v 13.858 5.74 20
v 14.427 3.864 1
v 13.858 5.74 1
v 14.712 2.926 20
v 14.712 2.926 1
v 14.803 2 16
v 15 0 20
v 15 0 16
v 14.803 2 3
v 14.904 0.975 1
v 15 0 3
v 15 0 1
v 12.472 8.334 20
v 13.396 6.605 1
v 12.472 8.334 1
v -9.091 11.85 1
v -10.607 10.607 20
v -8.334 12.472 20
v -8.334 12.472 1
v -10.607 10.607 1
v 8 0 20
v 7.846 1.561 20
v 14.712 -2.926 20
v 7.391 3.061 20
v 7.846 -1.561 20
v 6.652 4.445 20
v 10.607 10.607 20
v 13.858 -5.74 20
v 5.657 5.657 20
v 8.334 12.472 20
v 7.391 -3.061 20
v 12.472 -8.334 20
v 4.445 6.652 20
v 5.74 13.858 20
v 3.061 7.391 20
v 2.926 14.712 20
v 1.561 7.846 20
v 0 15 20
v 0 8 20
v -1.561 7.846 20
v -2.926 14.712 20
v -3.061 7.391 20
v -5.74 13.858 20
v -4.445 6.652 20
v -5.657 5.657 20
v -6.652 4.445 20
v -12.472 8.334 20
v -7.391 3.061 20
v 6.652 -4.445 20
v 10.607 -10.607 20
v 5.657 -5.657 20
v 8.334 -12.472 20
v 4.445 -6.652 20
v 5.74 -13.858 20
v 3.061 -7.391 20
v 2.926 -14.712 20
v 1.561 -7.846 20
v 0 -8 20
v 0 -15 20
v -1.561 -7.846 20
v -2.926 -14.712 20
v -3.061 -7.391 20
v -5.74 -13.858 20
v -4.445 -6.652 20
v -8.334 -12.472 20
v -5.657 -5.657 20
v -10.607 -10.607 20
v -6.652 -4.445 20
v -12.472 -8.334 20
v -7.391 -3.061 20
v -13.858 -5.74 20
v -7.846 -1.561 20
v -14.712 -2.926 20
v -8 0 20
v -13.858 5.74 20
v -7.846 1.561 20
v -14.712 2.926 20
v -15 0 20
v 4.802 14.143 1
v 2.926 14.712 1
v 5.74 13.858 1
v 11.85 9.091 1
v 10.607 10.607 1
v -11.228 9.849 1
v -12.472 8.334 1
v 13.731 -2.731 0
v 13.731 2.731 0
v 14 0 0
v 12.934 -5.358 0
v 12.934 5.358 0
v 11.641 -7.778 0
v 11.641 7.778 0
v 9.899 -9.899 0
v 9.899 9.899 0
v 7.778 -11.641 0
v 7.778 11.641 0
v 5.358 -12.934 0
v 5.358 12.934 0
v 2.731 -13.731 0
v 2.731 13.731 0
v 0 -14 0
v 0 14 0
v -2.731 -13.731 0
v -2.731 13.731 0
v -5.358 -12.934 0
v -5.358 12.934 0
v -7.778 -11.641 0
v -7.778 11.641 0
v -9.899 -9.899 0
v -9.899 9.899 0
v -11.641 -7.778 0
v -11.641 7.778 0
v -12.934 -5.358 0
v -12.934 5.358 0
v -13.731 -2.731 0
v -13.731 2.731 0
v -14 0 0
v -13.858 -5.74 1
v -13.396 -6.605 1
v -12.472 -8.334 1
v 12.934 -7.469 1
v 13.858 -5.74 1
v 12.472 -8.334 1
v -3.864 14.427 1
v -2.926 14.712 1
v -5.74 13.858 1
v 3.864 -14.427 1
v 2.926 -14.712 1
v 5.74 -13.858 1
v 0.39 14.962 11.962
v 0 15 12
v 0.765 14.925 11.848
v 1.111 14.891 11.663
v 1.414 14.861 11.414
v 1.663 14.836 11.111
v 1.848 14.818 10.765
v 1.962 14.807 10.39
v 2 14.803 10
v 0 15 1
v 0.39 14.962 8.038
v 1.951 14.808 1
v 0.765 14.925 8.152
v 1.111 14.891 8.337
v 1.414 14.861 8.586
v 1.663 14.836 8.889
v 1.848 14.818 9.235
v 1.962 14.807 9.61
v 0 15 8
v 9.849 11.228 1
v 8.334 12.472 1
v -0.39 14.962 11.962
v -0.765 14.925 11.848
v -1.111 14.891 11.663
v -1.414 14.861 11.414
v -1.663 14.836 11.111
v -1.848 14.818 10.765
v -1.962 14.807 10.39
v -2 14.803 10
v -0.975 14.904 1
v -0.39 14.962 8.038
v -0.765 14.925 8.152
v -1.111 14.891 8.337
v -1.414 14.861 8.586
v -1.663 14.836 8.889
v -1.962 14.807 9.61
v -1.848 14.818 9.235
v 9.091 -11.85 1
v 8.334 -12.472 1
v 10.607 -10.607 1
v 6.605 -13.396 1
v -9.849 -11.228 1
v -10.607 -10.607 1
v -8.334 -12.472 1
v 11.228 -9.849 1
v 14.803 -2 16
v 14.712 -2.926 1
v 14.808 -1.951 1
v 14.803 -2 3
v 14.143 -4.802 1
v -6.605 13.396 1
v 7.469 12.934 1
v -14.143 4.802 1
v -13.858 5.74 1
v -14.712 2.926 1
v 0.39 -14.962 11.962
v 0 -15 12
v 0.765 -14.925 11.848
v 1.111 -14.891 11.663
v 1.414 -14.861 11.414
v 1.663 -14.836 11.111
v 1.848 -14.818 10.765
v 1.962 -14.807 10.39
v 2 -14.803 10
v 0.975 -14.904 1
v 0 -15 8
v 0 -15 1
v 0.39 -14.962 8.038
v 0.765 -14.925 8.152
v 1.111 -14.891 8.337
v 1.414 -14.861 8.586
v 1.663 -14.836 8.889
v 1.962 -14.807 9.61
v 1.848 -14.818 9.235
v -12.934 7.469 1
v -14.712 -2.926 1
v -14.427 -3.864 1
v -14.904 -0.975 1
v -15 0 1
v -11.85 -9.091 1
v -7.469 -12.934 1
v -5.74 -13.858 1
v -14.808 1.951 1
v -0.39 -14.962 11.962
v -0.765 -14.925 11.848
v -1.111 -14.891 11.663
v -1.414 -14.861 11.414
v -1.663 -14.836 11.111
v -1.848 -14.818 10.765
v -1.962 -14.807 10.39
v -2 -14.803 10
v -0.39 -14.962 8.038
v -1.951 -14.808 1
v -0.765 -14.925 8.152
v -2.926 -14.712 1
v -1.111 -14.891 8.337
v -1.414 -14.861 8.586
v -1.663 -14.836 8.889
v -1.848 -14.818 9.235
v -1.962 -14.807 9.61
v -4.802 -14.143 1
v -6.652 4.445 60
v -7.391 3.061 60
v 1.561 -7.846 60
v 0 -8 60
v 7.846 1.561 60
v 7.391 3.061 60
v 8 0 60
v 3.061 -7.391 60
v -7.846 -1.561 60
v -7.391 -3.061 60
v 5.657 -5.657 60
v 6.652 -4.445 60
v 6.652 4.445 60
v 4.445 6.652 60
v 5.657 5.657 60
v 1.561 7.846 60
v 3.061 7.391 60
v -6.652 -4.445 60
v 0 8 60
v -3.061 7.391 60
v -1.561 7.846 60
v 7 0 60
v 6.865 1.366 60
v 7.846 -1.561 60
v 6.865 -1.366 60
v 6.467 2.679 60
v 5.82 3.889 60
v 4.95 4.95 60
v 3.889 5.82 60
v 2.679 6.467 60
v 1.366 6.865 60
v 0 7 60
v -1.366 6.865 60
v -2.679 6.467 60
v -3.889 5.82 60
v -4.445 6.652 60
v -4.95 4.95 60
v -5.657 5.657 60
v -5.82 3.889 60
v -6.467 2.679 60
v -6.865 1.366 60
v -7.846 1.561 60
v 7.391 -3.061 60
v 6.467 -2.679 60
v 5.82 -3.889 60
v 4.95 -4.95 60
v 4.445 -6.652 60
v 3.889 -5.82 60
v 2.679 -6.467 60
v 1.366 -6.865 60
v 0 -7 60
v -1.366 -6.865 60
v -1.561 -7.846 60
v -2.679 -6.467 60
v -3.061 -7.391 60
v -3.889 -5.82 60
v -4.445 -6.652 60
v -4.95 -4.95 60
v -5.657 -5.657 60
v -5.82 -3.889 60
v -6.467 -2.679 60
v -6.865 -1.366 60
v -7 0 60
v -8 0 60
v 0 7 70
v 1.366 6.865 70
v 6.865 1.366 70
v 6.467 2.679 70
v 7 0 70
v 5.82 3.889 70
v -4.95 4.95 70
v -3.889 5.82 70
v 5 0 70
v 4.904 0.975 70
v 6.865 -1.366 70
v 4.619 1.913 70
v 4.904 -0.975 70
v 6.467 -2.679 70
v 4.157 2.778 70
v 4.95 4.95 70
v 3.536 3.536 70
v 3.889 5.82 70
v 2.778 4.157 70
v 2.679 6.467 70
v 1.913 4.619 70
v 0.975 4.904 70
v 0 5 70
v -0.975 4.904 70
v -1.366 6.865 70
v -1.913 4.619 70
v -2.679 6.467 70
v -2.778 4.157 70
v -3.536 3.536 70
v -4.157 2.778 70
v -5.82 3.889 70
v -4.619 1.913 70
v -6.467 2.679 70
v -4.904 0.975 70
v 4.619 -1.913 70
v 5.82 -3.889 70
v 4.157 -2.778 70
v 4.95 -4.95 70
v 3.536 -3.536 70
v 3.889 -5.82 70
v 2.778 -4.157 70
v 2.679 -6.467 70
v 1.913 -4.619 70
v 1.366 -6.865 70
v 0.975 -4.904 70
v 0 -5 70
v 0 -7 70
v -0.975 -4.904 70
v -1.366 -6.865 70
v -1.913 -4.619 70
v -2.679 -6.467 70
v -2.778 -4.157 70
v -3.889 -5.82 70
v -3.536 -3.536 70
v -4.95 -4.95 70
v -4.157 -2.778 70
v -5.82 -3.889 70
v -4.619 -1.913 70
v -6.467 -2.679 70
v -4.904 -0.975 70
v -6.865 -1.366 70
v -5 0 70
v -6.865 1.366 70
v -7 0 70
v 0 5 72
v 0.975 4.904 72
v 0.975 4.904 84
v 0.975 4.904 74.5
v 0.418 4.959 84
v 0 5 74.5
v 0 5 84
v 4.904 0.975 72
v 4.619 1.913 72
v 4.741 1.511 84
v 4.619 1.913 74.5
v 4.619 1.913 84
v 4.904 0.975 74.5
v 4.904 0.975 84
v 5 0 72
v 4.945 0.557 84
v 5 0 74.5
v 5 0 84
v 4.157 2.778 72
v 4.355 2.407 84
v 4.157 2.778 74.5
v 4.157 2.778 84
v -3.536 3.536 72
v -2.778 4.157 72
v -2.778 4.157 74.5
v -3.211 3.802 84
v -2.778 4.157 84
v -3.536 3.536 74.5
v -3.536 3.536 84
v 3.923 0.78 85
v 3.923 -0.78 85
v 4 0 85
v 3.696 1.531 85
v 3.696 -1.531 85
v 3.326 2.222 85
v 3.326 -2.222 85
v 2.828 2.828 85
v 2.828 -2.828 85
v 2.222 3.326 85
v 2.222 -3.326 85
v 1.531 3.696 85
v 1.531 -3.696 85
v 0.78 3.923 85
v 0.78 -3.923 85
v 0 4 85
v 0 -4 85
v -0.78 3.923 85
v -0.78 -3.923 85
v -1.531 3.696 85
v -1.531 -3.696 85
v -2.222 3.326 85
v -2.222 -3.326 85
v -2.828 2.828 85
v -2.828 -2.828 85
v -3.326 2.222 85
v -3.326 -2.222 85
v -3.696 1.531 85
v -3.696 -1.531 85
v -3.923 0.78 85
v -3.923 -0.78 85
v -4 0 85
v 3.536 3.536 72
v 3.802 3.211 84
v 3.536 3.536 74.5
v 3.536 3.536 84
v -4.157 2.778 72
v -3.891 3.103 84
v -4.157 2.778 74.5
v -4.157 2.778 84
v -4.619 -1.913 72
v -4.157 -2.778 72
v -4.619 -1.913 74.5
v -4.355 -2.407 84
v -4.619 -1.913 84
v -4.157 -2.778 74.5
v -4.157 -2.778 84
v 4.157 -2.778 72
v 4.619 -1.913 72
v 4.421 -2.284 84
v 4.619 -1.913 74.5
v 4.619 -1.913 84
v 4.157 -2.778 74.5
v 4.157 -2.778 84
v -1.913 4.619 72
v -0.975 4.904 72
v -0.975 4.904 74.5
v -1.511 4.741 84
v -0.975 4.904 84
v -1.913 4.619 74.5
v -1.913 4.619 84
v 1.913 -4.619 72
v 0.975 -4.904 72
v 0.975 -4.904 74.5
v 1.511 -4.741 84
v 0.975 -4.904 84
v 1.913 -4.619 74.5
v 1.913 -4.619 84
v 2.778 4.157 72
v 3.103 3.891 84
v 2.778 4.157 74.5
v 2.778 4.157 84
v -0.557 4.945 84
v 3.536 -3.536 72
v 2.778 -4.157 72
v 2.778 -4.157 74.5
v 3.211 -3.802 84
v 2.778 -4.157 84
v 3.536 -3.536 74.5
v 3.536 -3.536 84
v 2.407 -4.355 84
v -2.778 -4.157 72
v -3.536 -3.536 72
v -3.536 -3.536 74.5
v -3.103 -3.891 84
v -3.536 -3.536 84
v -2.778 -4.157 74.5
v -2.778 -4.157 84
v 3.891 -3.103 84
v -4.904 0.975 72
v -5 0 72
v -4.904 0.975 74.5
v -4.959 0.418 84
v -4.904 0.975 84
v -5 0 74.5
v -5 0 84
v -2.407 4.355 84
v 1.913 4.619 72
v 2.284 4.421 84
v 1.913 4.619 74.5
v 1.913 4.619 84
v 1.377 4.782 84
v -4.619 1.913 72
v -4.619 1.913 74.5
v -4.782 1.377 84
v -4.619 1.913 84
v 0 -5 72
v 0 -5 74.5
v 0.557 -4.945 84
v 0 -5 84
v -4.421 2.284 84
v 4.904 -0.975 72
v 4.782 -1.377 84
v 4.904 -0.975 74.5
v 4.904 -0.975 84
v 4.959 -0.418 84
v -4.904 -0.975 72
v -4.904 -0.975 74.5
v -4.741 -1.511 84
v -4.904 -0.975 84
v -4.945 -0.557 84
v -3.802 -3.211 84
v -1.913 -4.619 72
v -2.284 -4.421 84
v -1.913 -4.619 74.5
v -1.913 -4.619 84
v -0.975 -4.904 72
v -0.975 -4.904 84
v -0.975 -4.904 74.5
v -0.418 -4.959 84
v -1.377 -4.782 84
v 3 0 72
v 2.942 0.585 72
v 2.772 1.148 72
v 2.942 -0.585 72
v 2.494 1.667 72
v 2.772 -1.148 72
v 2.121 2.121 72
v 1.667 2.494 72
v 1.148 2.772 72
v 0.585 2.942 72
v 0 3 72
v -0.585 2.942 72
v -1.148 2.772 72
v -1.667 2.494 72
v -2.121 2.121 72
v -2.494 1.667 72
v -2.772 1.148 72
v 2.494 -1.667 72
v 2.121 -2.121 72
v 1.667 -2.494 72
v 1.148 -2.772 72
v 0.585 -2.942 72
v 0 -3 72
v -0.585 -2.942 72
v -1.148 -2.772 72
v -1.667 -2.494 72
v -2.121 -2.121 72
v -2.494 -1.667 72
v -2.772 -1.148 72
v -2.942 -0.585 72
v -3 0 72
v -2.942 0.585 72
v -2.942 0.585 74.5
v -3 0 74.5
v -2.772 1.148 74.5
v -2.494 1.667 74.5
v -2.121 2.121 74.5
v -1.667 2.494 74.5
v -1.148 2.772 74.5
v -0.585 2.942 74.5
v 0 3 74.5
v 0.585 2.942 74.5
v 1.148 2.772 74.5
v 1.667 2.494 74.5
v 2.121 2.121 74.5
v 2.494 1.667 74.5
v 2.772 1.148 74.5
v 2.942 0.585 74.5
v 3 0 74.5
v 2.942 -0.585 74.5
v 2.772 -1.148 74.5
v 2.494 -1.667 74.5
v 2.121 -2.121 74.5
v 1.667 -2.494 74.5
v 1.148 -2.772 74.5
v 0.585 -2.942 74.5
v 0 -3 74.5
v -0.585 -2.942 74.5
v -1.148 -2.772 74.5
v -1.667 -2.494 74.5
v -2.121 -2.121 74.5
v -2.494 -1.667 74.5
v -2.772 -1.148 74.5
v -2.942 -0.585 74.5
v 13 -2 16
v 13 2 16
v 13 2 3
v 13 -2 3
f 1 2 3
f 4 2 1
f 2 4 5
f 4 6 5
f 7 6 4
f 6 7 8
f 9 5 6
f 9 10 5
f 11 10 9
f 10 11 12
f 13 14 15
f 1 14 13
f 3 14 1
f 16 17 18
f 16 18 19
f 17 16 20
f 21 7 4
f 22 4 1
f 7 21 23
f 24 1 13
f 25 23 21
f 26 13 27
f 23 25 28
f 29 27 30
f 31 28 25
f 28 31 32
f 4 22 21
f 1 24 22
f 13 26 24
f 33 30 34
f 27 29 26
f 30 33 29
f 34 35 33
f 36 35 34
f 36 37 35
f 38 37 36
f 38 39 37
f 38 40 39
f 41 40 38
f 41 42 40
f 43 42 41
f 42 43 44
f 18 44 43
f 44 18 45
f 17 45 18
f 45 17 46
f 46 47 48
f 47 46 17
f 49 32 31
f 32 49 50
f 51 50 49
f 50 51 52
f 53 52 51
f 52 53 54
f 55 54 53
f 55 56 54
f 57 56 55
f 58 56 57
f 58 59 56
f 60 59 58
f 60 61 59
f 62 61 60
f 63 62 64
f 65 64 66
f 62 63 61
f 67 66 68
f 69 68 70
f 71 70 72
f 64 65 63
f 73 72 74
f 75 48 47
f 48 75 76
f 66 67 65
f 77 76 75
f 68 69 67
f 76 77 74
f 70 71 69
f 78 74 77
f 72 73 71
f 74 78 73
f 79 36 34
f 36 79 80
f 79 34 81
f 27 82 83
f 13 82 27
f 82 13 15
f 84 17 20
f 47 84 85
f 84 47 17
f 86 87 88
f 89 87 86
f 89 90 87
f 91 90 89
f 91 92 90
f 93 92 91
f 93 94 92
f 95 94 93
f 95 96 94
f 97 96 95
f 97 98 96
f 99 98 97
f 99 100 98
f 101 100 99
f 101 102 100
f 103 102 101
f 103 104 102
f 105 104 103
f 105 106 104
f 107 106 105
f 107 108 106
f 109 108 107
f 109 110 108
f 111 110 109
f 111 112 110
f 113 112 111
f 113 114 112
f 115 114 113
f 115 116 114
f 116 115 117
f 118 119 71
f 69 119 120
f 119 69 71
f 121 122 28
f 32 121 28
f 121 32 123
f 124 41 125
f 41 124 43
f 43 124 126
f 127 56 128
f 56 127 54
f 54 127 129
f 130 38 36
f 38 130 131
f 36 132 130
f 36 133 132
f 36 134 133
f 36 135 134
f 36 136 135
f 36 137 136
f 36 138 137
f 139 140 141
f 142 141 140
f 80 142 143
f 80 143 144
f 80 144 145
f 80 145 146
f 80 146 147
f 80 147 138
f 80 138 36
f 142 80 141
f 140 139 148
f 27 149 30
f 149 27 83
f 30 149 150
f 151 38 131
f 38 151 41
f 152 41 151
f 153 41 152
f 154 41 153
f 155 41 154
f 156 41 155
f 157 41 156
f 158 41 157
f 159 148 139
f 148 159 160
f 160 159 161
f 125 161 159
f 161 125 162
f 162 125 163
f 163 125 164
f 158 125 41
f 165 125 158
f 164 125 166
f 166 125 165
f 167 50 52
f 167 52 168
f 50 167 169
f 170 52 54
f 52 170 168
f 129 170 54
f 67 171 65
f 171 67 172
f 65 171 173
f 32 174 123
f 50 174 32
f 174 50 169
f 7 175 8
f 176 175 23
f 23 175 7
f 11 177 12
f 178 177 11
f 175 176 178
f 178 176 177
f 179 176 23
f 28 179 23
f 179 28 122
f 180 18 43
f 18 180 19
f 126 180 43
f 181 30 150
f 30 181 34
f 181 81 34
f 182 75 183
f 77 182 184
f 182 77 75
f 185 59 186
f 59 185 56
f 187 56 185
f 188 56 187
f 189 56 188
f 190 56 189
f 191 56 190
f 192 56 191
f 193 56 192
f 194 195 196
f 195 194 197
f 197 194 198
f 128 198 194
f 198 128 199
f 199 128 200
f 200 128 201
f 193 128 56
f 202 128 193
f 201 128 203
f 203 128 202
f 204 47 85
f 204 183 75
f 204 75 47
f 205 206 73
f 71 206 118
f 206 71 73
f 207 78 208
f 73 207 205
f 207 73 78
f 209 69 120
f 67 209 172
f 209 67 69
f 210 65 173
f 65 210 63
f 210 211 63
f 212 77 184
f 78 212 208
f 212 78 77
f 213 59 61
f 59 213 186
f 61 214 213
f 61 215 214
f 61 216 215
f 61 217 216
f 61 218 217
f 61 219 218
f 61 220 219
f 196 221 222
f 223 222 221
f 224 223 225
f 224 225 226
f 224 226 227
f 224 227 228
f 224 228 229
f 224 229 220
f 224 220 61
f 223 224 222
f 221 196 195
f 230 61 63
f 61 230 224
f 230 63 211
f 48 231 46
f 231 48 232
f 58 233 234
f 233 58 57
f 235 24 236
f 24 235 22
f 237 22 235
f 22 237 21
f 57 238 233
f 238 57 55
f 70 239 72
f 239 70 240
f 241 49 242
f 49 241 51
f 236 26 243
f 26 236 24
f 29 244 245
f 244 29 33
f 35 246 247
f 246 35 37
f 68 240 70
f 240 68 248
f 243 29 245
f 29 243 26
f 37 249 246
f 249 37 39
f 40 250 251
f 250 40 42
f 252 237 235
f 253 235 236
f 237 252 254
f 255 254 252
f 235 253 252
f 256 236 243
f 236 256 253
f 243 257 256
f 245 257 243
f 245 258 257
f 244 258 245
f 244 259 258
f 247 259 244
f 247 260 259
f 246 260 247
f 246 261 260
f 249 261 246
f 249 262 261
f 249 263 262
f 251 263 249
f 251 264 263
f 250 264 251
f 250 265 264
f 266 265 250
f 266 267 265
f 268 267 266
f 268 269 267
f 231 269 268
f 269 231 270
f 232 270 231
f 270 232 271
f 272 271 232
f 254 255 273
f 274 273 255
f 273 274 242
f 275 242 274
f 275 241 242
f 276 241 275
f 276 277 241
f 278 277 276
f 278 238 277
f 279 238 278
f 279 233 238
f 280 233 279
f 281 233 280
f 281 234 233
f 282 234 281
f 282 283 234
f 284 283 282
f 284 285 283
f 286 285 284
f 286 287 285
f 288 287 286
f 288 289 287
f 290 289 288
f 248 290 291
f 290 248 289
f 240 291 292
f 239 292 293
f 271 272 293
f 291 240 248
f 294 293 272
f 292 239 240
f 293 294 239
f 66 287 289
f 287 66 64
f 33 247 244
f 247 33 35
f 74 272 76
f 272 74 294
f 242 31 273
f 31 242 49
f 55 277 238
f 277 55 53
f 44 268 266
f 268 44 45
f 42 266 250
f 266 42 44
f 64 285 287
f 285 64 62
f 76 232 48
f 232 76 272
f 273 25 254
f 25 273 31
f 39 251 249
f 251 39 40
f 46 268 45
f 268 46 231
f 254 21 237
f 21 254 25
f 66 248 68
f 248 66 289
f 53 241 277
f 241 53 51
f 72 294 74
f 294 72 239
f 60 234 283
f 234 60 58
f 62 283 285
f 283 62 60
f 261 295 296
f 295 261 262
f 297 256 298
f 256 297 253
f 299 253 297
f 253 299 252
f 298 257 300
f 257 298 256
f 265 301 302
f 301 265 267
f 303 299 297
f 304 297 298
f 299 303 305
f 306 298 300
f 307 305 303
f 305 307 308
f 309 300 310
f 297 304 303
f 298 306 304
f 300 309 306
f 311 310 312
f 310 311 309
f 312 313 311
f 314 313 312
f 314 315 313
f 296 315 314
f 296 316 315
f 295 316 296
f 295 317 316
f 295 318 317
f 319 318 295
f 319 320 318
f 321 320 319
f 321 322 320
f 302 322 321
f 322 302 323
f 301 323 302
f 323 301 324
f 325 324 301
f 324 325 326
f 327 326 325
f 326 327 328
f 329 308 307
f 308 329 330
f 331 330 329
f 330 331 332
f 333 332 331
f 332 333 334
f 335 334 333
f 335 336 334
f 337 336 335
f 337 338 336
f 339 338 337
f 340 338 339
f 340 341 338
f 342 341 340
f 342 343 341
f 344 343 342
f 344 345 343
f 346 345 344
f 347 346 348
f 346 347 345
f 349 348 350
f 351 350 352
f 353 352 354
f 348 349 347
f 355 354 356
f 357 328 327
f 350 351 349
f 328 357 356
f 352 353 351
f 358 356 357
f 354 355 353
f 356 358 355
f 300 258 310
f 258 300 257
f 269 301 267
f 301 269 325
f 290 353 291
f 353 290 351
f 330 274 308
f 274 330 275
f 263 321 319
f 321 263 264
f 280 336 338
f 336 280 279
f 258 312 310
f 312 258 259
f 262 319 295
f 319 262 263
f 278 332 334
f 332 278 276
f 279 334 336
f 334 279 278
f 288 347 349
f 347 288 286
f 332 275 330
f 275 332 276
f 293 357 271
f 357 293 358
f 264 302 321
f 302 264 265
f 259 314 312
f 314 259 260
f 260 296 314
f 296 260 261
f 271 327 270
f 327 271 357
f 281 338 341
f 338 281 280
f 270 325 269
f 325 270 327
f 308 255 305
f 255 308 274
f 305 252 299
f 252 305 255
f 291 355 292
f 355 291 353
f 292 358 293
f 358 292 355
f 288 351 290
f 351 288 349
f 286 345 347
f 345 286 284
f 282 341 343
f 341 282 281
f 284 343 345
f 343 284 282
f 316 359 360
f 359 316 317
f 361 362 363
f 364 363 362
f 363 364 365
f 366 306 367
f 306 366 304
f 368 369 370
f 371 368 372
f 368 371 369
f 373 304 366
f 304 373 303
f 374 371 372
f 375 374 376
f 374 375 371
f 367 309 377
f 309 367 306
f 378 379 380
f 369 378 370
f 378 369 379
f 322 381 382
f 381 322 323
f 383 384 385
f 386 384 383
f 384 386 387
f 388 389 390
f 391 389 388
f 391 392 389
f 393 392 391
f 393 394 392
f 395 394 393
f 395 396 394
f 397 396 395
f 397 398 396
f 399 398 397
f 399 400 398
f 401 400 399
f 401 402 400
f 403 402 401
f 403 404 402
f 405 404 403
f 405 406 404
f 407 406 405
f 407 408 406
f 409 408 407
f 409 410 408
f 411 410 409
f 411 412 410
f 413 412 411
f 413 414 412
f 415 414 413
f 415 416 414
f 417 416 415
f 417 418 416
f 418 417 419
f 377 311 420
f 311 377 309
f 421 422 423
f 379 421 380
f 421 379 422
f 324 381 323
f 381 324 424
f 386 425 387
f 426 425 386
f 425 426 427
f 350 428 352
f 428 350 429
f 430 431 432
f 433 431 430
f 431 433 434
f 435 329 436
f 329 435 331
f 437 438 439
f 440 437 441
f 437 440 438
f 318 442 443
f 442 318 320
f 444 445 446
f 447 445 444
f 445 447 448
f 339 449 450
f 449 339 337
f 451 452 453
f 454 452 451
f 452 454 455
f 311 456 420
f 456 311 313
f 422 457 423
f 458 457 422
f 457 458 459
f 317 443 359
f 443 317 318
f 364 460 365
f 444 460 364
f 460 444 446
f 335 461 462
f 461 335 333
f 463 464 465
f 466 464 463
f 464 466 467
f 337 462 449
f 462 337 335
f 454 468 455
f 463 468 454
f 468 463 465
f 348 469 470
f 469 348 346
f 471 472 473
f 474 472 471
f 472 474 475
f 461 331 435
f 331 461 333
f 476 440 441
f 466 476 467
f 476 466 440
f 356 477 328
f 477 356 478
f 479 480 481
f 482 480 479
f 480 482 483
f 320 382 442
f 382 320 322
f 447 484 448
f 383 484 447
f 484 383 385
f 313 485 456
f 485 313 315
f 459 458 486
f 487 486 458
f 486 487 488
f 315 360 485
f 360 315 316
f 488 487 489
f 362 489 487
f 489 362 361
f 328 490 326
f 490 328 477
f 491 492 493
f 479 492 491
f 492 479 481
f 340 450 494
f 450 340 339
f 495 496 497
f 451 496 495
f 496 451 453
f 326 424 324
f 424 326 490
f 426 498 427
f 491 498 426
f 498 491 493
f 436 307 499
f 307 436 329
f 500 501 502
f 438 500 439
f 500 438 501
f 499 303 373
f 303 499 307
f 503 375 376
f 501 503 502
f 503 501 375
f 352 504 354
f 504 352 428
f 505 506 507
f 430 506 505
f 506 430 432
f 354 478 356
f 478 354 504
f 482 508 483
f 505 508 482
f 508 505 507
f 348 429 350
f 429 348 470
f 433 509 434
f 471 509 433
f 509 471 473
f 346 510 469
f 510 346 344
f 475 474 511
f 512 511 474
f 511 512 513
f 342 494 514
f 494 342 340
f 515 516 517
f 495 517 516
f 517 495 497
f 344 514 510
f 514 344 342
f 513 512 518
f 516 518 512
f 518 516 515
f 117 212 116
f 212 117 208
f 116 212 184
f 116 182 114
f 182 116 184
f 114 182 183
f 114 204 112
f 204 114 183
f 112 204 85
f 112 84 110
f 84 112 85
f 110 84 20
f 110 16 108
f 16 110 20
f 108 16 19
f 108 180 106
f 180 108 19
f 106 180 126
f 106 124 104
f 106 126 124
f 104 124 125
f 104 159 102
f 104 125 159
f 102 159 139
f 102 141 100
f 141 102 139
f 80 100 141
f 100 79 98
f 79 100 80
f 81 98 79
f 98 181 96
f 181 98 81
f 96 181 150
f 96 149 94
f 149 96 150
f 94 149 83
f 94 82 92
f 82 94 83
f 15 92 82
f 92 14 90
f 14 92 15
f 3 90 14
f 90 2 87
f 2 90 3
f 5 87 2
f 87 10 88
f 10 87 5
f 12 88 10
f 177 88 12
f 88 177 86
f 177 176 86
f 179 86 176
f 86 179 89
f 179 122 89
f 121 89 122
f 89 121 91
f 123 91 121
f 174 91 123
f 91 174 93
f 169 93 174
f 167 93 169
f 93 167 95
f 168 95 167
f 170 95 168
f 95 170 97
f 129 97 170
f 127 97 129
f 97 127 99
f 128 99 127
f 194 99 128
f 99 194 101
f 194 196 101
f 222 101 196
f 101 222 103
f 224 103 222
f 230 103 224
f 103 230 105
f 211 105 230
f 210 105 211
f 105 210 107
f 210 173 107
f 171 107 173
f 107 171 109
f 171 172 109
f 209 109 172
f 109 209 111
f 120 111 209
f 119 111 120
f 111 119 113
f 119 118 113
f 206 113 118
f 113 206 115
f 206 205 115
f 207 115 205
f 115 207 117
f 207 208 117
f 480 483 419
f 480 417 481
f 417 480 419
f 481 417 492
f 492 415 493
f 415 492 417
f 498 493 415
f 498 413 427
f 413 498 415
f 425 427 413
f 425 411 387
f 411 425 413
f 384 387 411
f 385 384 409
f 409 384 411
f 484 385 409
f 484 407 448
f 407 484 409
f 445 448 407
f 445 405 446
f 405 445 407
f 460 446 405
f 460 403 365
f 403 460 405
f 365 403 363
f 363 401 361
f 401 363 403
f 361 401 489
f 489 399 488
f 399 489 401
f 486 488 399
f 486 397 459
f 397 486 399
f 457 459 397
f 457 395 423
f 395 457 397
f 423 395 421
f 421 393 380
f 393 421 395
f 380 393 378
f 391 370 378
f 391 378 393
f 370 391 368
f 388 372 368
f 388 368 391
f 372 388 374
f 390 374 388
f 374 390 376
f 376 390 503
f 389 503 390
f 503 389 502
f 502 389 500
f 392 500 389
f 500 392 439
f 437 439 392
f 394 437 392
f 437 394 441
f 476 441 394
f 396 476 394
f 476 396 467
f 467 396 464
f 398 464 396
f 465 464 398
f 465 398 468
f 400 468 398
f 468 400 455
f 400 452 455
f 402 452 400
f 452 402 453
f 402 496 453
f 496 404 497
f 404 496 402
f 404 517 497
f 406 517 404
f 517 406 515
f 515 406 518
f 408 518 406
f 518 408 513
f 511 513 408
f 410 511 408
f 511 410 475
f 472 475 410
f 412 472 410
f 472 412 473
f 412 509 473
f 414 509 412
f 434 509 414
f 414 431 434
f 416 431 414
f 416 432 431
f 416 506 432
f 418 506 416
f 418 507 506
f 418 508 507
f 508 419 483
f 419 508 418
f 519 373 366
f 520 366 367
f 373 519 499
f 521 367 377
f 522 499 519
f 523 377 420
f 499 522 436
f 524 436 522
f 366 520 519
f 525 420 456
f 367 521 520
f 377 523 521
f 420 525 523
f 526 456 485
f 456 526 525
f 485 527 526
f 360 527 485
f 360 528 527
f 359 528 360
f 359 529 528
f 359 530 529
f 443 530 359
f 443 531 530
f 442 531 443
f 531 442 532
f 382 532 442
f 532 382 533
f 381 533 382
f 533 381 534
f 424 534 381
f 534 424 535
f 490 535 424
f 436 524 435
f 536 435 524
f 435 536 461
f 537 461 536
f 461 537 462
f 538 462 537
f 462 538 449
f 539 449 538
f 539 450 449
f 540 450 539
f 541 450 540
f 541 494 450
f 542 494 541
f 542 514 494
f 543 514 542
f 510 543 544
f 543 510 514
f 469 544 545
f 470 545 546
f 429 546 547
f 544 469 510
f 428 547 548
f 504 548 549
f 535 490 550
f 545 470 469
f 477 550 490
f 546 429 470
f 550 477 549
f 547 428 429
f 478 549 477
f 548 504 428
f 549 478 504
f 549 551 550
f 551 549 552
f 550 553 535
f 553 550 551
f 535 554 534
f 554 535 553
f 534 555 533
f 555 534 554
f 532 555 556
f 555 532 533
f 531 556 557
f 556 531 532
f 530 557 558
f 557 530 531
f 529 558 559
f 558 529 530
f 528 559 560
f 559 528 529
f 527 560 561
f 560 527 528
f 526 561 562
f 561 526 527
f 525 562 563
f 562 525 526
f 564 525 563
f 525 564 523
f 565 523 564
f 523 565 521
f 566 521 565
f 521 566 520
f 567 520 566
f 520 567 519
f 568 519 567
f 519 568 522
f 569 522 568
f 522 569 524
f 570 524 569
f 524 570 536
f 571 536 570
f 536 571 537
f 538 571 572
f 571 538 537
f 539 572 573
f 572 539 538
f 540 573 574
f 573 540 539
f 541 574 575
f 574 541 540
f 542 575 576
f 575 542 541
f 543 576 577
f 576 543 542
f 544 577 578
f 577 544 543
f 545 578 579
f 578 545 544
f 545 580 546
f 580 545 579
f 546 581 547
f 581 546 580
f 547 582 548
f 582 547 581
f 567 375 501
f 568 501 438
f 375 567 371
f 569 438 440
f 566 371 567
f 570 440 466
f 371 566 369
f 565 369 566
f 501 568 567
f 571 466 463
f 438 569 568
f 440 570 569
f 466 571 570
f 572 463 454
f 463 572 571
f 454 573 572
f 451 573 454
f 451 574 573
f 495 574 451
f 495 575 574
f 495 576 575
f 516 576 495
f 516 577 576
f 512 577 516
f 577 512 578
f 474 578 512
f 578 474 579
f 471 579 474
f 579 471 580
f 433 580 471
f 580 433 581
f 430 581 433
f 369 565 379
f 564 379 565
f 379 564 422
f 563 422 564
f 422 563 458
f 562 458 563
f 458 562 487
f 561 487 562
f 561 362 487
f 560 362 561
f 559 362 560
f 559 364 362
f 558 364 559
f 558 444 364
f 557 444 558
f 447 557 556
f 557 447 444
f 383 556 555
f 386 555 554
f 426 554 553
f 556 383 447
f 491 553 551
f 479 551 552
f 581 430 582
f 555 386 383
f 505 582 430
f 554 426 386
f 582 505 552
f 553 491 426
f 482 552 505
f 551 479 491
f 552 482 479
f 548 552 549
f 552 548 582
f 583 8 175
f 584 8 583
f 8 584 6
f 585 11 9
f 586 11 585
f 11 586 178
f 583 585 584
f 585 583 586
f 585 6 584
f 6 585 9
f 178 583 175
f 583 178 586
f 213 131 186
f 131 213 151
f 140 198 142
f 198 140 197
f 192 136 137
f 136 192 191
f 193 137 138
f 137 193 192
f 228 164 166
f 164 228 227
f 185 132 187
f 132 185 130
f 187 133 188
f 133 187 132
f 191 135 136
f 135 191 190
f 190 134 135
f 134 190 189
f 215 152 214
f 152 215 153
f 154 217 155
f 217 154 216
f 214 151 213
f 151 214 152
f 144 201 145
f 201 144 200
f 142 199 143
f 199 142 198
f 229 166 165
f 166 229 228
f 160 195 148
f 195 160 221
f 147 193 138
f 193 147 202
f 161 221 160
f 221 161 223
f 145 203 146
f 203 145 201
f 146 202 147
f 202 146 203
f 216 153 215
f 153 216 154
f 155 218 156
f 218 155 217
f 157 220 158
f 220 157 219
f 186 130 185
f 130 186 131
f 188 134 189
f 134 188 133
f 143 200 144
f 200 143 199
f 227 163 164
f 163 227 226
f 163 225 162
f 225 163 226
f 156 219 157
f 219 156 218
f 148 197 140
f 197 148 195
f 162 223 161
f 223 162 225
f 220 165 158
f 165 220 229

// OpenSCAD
$fn = 32;

// ----------------------------------------------------------------------
// Stepped shaft: diameters 30, 16, 14, 10 mm, 85 mm long
// ----------------------------------------------------------------------

// --- parameters (mm) ---
d1 = 30;                  // step 1 diameter
len1 = 20;                // step 1 length
d2 = 16;                  // step 2 diameter
len2 = 40;                // step 2 length
d3 = 14;                  // step 3 diameter
len3 = 10;                // step 3 length
d4 = 10;                  // step 4 diameter
len4 = 15;                // step 4 length
total = 85;               // overall length
chamfer = 1;              // end chamfer
groove_r = 5;             // groove radius
groove_z = 72;            // groove position from the end
groove_w = 2.5;           // groove width
groove_d = 2;             // groove depth
key_w = 4;                // keyway width
key_d = 2;                // keyway depth
key_len = 13;             // keyway length
key_z = 3;                // keyway start along the shaft
cross_d = 4;              // cross pin hole
cross_z = 10;             // cross hole position

difference() {
  /* turned body: stacked cylinders, every step sunk into the bigger one */
  union() {
    cylinder(h = len1, d = d1);
    translate([0, 0, 19.6]) cylinder(h = 40.4, d = d2);
    translate([0, 0, 59.6]) cylinder(h = 10.4, d = d3);
    translate([0, 0, 69.6]) cylinder(h = 15.4, d = d4);
  }
  /* bottom chamfer ring cut */
  rotate_extrude() translate([14, -2.5]) polygon([[0, 0], [3.5, 0], [3.5, 6], [0, 2.5]]);
  /* top chamfer ring cut */
  rotate_extrude() translate([4, 85]) polygon([[0, 0], [3.5, -3.5], [3.5, 2.5], [0, 2.5]]);
  /* circlip groove just behind the shoulder */
  rotate_extrude() translate([groove_r - groove_d, groove_z]) square([groove_d + 2.5, groove_w]);
  /* keyway milled along the first step */
  translate([d1 / 2 - key_d, -key_w / 2, key_z]) cube([key_d + 2.5, key_w, key_len]);
  /* cross pin hole through the small step */
  translate([0, 0, cross_z]) rotate([90, 0, 0]) cylinder(h = d1 + 5, d = cross_d, center = true);
}
